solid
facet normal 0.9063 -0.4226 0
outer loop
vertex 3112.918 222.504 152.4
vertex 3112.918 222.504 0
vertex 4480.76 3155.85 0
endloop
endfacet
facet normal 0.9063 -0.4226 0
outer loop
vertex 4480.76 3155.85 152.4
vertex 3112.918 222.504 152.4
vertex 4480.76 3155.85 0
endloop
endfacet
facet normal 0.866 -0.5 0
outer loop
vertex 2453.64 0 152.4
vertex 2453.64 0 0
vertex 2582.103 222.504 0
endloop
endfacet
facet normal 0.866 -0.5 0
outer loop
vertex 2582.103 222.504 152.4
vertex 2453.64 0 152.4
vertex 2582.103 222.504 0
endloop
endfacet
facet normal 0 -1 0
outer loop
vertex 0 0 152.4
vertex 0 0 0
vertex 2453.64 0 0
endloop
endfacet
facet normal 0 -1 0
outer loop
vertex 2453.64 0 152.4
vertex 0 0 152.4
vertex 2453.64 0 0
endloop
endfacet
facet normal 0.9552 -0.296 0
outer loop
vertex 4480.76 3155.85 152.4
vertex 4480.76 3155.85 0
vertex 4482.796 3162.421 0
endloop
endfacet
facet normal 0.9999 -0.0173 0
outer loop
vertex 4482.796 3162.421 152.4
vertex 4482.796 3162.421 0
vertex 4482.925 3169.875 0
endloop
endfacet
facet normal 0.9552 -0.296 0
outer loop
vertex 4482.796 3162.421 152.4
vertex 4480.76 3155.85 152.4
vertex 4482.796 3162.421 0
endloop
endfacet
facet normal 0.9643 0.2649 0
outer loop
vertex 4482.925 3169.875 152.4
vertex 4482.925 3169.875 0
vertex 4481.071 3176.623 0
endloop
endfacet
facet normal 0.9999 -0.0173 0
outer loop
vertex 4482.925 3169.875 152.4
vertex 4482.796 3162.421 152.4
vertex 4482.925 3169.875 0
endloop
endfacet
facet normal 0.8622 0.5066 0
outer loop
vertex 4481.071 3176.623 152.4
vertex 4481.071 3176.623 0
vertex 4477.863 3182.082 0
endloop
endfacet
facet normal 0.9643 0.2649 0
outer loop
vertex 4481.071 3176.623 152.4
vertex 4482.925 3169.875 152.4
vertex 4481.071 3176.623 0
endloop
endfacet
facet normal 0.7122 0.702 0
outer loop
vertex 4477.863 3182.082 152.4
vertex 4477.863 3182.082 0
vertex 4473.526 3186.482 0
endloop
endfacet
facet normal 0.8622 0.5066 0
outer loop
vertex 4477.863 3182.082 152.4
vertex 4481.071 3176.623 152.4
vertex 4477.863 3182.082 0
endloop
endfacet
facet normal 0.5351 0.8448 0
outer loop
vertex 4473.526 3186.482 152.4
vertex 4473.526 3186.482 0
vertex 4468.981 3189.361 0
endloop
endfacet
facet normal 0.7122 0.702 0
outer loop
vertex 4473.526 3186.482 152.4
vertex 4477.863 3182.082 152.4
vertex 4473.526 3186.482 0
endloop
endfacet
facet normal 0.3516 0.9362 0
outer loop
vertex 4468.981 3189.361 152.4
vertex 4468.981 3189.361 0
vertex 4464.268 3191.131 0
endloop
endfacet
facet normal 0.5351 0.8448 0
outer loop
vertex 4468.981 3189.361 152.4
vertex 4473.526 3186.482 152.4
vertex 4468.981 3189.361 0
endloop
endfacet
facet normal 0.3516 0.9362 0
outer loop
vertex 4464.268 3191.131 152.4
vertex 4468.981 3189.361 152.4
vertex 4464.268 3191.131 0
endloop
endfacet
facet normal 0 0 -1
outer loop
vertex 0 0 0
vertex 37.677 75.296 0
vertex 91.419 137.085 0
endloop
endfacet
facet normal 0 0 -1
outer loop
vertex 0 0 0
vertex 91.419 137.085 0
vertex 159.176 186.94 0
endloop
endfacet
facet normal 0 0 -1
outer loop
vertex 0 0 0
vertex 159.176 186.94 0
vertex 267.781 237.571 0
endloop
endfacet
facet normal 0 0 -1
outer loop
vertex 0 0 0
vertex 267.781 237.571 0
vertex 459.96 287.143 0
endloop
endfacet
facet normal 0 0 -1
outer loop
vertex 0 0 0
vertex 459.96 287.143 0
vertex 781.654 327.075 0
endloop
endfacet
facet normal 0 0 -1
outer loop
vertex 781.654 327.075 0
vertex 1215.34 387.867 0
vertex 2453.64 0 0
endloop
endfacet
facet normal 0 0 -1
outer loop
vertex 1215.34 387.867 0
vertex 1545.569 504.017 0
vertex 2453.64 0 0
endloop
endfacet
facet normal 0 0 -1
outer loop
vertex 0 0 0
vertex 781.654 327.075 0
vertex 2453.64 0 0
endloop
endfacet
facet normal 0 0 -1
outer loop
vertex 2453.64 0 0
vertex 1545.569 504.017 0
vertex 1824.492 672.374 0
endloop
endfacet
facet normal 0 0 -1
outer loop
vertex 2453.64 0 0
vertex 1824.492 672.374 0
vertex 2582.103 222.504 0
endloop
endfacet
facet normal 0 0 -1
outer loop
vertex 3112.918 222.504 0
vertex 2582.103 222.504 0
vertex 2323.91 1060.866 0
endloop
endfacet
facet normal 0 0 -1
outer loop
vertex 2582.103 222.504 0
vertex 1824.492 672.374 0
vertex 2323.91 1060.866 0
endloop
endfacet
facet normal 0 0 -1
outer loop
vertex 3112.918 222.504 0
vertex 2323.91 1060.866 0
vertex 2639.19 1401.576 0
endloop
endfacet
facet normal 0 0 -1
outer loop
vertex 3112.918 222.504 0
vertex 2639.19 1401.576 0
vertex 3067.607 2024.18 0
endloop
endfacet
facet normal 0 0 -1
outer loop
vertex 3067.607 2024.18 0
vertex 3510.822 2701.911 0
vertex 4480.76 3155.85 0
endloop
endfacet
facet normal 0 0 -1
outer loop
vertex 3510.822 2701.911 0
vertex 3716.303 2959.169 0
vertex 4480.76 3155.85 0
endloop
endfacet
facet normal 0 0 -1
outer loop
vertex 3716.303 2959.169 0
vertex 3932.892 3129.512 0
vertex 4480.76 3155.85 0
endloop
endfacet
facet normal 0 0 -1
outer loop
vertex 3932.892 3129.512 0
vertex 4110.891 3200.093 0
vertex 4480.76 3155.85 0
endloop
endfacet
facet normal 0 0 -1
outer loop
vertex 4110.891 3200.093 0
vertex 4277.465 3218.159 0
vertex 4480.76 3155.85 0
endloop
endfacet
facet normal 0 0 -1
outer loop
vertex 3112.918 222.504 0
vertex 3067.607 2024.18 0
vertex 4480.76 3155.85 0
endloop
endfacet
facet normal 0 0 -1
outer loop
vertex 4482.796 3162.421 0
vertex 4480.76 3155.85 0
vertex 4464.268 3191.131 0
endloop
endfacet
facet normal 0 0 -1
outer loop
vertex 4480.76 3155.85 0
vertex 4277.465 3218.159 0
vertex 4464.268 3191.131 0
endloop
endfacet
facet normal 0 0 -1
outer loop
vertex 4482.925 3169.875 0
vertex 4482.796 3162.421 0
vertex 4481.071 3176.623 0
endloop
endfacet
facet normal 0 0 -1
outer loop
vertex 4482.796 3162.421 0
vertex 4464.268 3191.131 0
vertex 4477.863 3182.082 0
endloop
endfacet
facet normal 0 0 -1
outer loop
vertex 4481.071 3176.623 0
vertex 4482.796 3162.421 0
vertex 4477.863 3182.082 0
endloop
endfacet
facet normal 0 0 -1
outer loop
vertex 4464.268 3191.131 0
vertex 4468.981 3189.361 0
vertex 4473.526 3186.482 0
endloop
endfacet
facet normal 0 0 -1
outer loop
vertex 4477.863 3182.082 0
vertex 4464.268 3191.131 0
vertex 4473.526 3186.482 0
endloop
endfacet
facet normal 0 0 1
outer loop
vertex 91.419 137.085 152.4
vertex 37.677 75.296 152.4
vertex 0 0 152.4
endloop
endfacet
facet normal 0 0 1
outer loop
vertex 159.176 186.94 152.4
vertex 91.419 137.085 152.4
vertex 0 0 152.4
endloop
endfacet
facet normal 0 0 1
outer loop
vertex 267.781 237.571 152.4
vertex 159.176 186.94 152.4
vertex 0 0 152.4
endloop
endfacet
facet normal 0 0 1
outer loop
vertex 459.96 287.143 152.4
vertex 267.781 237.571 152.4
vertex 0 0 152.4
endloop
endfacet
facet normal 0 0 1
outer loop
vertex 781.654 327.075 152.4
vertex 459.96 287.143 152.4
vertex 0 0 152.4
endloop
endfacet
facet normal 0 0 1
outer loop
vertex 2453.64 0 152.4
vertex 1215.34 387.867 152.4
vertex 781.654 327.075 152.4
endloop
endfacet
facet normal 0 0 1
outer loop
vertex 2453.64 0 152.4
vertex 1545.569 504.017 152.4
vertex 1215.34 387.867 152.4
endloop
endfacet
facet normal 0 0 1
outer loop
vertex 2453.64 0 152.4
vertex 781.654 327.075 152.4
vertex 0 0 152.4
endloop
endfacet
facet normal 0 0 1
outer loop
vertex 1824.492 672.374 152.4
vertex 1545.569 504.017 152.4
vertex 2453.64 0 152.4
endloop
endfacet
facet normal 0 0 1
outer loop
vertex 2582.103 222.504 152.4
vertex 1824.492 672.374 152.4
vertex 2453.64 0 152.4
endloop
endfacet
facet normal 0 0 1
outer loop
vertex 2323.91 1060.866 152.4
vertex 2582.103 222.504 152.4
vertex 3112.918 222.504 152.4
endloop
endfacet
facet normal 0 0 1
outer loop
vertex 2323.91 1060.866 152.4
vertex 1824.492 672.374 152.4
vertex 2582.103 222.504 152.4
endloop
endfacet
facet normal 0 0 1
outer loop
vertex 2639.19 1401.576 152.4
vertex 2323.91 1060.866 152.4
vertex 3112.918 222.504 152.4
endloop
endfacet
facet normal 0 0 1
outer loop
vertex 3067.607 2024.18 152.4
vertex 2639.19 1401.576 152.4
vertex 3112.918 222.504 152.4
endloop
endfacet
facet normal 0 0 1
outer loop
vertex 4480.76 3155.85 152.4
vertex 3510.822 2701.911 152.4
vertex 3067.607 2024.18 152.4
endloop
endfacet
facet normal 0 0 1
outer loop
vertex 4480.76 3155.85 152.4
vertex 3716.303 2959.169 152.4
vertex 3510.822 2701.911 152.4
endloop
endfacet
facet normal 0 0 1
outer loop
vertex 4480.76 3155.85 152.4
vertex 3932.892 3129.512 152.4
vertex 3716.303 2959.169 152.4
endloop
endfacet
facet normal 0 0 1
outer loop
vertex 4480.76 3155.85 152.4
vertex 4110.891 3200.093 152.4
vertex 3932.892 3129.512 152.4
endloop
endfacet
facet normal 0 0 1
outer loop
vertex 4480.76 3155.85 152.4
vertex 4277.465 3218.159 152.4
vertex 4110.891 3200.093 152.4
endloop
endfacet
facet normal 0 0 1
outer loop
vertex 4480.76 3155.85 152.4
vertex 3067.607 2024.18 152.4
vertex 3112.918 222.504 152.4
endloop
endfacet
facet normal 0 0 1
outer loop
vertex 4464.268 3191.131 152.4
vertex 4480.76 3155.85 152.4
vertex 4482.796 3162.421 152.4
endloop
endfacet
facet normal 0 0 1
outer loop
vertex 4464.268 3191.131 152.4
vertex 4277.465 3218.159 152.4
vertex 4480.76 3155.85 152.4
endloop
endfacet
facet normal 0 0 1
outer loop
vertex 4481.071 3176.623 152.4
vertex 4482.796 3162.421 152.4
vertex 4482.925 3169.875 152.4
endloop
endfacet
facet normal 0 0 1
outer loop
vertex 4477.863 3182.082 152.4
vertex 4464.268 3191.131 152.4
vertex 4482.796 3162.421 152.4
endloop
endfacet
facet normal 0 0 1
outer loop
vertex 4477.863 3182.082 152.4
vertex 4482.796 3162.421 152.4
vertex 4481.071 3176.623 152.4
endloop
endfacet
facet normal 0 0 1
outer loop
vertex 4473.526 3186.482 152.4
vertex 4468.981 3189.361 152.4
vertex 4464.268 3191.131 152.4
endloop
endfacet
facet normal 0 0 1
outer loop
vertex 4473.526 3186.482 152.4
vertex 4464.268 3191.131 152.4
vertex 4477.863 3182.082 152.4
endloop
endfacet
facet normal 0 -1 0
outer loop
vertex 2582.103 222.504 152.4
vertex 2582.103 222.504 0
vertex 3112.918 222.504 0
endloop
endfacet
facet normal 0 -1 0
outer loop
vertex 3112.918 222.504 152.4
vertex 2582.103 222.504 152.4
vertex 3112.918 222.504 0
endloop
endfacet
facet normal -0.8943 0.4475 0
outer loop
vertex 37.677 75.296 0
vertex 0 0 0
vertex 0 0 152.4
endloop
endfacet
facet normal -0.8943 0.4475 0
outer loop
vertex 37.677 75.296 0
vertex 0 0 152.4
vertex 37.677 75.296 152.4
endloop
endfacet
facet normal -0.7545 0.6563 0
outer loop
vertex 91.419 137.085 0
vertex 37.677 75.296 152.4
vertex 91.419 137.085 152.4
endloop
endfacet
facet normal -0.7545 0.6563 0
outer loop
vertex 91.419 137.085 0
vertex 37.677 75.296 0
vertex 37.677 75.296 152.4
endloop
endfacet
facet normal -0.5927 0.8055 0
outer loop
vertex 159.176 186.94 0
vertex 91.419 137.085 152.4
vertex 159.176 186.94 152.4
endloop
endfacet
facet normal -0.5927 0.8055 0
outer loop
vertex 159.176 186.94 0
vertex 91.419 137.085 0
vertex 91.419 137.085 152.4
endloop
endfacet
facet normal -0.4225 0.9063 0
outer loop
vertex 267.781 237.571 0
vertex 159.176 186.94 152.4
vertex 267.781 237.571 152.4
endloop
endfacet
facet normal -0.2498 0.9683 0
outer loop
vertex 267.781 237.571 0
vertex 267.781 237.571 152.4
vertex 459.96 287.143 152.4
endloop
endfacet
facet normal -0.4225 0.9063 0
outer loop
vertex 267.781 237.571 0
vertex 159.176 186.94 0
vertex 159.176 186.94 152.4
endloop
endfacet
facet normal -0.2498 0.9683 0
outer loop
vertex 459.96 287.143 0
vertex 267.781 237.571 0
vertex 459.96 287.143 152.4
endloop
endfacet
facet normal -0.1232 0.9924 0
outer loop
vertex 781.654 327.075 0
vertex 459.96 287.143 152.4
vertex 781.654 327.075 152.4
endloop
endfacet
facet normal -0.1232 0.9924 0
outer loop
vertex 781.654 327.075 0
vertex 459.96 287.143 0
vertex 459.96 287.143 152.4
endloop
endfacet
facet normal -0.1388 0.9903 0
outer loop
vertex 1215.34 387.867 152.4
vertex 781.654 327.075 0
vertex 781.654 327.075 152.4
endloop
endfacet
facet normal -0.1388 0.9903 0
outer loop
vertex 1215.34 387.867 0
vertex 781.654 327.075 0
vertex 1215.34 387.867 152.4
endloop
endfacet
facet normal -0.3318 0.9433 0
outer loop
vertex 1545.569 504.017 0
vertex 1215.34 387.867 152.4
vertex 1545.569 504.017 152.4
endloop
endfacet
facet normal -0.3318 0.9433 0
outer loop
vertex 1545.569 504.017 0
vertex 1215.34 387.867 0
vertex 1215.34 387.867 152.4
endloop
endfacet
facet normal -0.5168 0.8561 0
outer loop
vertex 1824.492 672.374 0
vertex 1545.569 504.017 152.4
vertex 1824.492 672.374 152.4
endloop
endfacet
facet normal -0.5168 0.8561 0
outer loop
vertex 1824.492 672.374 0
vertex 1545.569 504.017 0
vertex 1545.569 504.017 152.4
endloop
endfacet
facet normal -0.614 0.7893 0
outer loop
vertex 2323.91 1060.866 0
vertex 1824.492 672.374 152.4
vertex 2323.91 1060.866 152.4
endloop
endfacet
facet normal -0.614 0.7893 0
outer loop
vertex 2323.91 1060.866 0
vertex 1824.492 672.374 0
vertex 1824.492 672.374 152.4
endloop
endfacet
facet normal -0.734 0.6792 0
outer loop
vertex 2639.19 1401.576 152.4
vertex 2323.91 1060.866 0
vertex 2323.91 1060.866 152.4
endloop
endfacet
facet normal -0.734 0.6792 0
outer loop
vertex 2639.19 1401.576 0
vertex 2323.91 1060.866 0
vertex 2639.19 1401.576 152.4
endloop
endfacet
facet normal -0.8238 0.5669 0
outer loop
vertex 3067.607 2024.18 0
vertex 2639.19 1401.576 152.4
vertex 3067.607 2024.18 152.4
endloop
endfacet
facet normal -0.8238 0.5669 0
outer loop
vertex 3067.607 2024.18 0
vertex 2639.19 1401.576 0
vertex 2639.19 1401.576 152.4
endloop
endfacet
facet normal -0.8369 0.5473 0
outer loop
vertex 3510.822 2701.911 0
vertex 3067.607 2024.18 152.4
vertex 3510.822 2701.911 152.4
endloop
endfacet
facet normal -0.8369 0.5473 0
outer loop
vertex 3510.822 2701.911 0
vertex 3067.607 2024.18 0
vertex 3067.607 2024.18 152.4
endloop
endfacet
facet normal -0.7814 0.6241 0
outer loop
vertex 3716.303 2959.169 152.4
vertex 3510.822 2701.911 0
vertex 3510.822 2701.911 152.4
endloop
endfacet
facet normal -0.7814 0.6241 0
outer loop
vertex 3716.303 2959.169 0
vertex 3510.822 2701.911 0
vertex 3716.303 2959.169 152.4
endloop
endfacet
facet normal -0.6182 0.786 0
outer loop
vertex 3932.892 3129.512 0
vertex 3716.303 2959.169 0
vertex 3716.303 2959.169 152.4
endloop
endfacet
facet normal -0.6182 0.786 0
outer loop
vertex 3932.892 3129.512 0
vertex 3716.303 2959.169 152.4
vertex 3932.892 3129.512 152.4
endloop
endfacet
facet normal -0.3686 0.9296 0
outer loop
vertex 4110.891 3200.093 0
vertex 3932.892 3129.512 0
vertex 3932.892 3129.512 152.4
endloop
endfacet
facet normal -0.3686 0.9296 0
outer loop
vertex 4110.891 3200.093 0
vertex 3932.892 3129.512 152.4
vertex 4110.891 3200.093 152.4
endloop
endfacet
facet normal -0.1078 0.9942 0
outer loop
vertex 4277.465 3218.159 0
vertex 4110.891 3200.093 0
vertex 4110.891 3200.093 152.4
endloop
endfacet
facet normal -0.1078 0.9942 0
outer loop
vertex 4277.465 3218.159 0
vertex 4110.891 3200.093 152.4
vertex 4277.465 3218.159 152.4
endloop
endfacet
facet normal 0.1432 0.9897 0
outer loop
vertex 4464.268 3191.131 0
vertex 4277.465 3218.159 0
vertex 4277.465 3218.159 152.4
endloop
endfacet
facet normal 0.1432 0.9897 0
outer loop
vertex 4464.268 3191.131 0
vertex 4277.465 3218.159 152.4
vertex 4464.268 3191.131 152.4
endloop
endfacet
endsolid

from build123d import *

# Parameters (mm, degrees)
BOSS_EXTRUDE1_DEPTH = 152.4
FILLET1_R           = 25.4


with BuildPart() as part:
    # Sketch1 → Boss-Extrude1 (new body)
    with BuildSketch(Plane.XY):
        with BuildLine():
            Line((0, 0), (2453.64, 0))
            Line((2453.64, 0), (2582.102744296, 222.504))
            Line((2582.102744296, 222.504), (3112.917808657, 222.504))
            Line((3112.917808657, 222.504), (4493.361010629, 3182.874))
            add(Edge.make_bspline(
                [(0, 0), (116.998830003, 333.573371339), (1063.479959181, 273.483968866), (1615.605801809, 525.977034044), (2074.666267804, 847.032915734), (2399.476424156, 1097.38893033), (2745.924318913, 1535.792394611), (2889.333282638, 1753.369272984), (3207.904477215, 2236.567384367), (3278.555026222, 2366.317843455), (3948.747804981, 3347.088718294), (4493.361010629, 3182.874)],
                knots=[0, 0, 0, 0, 0.1321567, 0.223213503, 0.257951388, 0.454915081, 0.494597021, 0.61508885, 0.653759963, 0.84263704, 1, 1, 1, 1], degree=3))
        make_face()
    extrude(amount=BOSS_EXTRUDE1_DEPTH)

    # Fillet1
    fillet1_edges = [part.edges().sort_by_distance(p)[0] for p in [
        (4493.361010629, 3182.874, 76.2),
    ]]
    fillet(fillet1_edges, radius=FILLET1_R)


solid = part.part
